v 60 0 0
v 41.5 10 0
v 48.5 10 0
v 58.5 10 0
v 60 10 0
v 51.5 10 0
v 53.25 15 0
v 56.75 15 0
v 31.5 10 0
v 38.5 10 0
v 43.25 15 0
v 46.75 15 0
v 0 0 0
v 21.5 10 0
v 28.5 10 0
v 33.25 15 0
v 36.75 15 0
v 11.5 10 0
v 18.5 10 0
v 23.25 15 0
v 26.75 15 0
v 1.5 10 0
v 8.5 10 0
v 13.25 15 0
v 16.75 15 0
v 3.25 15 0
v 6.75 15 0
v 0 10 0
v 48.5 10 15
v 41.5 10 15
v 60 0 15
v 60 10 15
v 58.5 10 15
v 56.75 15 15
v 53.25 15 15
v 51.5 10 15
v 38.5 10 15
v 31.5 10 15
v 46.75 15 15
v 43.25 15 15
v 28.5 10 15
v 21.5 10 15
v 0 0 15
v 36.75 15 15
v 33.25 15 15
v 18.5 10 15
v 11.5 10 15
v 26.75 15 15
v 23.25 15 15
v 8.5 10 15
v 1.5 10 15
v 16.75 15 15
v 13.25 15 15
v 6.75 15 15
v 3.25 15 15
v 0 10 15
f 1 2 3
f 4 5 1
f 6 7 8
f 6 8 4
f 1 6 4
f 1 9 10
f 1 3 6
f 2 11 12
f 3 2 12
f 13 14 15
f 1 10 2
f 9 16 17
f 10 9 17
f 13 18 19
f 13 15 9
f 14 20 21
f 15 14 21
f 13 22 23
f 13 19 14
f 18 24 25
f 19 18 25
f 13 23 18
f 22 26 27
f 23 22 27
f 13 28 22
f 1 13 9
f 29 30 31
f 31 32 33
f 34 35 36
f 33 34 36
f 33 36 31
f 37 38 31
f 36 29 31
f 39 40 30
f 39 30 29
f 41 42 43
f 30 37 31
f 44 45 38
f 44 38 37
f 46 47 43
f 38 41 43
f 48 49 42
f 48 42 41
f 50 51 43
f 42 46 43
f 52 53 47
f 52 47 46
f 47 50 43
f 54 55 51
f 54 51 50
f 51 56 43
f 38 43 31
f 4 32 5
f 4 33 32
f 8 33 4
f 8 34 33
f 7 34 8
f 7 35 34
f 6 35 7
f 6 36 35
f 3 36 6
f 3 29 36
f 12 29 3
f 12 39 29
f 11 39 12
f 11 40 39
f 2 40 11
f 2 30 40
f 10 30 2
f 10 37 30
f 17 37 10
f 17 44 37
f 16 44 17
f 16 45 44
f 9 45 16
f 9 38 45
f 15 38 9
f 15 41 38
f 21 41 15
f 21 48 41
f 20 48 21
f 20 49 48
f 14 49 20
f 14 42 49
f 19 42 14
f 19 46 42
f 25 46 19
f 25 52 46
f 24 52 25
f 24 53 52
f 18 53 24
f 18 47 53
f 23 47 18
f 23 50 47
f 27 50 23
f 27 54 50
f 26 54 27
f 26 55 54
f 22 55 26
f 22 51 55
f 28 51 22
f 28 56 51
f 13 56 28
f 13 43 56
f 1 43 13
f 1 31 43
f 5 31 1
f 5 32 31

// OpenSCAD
$fn = 32;

// ----------------------------------------------------------------------
// Gear rack: 6 teeth, pitch 10 mm
// ----------------------------------------------------------------------

// --- parameters (mm) ---
teeth = 6;                // number of teeth
pitch = 10;               // tooth pitch, X
root_w = 7;               // tooth width at the root
tip_w = 3.5;              // tooth width at the tip
base_h = 10;              // rack body height, Y
tooth_h = 5;              // tooth height above the body
plate_t = 15;             // rack width, Z (extrusion height)

rack_l = teeth * pitch;  // overall length
total_h = base_h + tooth_h;  // overall height

profile = [[0, 0], [60, 0], [60, 10], [58.5, 10], [56.75, 15], [53.25, 15], [51.5, 10], [48.5, 10], [46.75, 15], [43.25, 15], [41.5, 10], [38.5, 10], [36.75, 15], [33.25, 15], [31.5, 10], [28.5, 10], [26.75, 15], [23.25, 15], [21.5, 10], [18.5, 10], [16.75, 15], [13.25, 15], [11.5, 10], [8.5, 10], [6.75, 15], [3.25, 15], [1.5, 10], [0, 10]];  // primary outline, 28 points, counter clockwise

// --- the one profile operation ---
linear_extrude(height = plate_t) polygon(points = profile);
